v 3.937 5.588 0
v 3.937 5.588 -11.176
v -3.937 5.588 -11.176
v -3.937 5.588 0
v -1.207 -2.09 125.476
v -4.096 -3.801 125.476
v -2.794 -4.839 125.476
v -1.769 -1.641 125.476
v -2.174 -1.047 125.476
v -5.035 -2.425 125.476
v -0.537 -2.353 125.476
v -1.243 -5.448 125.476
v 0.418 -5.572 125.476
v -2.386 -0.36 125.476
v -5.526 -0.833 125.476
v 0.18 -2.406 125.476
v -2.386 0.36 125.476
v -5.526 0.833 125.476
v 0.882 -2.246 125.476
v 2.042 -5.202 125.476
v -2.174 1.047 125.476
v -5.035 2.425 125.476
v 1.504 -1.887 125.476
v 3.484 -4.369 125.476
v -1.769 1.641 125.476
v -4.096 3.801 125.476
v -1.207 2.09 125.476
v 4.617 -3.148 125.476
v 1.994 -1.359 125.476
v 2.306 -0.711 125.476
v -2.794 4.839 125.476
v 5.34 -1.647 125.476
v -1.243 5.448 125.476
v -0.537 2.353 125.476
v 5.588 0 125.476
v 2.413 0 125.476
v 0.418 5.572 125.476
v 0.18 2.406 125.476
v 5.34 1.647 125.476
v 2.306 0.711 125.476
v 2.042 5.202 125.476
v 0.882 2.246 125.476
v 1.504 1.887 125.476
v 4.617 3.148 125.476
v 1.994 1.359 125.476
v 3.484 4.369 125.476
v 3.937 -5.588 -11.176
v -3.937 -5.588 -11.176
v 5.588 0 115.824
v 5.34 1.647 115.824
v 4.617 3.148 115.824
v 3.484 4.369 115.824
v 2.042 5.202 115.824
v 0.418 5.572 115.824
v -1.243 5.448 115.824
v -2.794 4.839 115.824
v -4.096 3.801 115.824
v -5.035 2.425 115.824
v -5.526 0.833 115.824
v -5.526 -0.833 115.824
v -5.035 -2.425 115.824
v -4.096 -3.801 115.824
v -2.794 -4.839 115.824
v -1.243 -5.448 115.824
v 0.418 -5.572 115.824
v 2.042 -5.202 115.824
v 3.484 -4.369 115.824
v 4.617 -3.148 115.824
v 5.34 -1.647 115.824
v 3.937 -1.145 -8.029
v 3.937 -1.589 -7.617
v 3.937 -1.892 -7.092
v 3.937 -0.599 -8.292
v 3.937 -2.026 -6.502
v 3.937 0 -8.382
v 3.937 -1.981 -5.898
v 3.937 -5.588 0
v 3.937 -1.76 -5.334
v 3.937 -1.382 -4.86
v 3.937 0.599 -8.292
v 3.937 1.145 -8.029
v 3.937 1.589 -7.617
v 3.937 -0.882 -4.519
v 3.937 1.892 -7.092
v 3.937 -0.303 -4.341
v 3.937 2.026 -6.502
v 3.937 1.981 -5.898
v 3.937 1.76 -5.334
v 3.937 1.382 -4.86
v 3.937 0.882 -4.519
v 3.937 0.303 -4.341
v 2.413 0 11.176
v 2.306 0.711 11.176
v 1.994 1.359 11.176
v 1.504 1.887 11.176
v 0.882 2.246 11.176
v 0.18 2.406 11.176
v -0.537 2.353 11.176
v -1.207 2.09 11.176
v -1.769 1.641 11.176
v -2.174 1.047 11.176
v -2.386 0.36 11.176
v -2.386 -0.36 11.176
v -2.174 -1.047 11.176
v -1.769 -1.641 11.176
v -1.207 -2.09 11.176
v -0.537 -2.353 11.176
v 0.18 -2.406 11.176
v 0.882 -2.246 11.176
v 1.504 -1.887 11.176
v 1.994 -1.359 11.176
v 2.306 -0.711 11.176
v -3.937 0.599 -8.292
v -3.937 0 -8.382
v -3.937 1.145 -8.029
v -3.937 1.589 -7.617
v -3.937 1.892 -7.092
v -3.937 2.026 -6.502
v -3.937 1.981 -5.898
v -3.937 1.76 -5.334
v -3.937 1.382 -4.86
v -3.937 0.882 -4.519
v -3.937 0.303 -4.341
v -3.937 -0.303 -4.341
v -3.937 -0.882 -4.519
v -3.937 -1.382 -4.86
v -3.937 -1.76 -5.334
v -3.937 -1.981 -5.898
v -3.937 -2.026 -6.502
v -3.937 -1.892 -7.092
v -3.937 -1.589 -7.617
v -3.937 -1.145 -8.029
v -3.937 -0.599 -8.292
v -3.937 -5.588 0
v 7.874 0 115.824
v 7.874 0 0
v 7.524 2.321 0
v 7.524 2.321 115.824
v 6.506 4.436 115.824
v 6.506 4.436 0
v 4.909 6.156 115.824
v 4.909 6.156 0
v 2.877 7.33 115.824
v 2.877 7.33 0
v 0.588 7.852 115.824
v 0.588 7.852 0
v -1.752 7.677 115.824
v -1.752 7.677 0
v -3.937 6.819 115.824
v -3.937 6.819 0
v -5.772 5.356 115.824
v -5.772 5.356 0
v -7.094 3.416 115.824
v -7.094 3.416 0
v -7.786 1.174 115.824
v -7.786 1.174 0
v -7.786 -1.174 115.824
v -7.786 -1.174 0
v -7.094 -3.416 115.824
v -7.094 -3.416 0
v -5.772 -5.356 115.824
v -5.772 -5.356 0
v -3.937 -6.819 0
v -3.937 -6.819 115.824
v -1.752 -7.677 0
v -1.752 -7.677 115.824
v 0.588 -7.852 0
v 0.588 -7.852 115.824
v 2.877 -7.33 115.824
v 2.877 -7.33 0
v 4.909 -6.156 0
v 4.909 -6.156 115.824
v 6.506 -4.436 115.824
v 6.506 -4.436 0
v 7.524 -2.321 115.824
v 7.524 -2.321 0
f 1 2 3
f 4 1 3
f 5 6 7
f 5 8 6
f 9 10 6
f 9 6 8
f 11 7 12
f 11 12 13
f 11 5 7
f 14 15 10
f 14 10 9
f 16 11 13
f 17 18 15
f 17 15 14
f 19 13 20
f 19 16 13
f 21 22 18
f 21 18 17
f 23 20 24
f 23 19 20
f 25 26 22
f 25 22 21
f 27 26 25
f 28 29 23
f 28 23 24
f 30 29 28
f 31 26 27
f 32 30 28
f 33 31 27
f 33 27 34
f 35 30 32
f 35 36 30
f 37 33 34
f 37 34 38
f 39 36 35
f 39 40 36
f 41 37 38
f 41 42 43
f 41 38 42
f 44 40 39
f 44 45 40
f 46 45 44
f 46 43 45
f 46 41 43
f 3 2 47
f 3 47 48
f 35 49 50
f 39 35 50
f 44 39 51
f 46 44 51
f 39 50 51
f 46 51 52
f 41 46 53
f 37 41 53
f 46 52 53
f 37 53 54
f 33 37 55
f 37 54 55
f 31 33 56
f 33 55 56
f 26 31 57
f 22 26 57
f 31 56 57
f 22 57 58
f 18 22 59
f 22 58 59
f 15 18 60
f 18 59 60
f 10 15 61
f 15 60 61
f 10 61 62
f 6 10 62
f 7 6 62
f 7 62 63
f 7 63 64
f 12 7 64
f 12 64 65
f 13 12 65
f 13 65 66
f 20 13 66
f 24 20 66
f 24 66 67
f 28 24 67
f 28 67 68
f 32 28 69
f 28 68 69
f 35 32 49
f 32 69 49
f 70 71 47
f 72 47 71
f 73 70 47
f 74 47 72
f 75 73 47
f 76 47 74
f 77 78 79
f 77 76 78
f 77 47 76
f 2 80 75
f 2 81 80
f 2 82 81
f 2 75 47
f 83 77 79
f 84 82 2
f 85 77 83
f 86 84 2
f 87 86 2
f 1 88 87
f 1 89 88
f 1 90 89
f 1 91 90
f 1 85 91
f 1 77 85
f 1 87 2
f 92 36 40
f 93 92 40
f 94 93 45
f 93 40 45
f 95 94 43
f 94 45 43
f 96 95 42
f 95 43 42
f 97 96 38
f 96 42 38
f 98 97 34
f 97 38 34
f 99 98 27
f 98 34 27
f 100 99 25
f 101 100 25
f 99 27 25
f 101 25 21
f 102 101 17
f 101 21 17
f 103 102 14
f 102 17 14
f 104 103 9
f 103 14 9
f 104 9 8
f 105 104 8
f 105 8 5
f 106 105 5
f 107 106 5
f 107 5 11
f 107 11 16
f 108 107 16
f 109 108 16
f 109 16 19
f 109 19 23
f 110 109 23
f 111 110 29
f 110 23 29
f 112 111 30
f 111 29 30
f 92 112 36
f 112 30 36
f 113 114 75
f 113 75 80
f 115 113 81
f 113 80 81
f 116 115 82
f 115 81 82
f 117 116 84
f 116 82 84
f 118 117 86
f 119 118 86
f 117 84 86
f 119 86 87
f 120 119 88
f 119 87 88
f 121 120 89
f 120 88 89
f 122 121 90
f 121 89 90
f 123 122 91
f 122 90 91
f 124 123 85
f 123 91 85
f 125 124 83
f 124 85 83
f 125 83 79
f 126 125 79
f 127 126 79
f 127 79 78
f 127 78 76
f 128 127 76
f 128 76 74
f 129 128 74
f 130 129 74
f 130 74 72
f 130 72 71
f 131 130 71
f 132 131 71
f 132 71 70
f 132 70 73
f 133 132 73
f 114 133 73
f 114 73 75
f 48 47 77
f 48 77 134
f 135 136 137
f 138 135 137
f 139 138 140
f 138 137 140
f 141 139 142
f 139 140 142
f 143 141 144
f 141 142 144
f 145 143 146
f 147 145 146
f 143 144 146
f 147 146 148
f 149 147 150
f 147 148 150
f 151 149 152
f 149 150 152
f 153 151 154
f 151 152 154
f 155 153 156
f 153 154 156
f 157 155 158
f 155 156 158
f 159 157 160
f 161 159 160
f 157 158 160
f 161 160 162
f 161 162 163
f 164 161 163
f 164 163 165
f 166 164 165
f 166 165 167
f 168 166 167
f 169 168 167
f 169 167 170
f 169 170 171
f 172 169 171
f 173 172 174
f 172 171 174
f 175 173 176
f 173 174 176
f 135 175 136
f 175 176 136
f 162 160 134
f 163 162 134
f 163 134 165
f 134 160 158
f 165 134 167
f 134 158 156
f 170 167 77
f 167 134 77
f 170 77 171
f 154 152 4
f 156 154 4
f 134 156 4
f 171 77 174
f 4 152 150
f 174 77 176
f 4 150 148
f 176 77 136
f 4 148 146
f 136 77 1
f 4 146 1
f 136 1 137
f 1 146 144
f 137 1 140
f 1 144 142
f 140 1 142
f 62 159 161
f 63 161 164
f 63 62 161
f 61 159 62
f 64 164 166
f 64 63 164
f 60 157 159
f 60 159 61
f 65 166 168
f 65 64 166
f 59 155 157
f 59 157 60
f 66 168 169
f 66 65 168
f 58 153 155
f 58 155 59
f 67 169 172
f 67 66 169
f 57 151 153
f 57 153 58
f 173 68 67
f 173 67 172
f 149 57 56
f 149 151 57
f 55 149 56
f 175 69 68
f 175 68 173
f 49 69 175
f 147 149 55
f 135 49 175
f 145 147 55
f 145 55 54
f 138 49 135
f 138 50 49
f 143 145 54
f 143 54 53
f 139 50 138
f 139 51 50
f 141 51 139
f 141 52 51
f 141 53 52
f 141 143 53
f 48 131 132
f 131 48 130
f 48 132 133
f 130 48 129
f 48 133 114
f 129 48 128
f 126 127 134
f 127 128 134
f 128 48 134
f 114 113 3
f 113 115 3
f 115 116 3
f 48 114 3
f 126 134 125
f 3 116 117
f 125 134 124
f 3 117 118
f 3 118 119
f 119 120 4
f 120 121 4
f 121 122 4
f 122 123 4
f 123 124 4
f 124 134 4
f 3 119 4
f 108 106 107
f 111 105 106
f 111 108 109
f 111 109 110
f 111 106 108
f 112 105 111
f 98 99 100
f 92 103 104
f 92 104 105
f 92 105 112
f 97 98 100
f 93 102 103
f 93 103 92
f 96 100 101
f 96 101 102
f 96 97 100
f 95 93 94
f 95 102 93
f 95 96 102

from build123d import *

# Parameters (mm, degrees)
SKETCH1_R           = 7.874
BOSS_EXTRUDE1_DEPTH = 115.824
SKETCH2_R           = 5.588
BOSS_EXTRUDE2_DEPTH = 9.652
SKETCH3_W           = 7.874
SKETCH3_H           = 11.176
BOSS_EXTRUDE3_DEPTH = 11.176
SKETCH4_R           = 2.032
CUT_EXTRUDE1_DEPTH  = 12.811
SKETCH5_R           = 2.413
CUT_EXTRUDE2_DEPTH  = 114.3


with BuildPart() as part:
    # Sketch1 → Boss-Extrude1 (new body)
    with BuildSketch(Plane.XY):
        Circle(SKETCH1_R)
    extrude(amount=BOSS_EXTRUDE1_DEPTH)

    # Sketch2 → Boss-Extrude2 (add)
    with BuildSketch(Plane.XY.offset(115.824)):
        Circle(SKETCH2_R)
    extrude(amount=BOSS_EXTRUDE2_DEPTH)

    # Sketch3 → Boss-Extrude3 (add)
    with BuildSketch(Plane(origin=(0, 0, 0), x_dir=(-1, 0, 0), z_dir=(0, 0, -1))):
        Rectangle(SKETCH3_W, SKETCH3_H)
    extrude(amount=BOSS_EXTRUDE3_DEPTH)

    # Sketch4 → Cut-Extrude1 (cut, through all)
    with BuildSketch(Plane(origin=(3.937, 0, 0), x_dir=(0, 0, -1), z_dir=(1, 0, 0))):
        with Locations((6.35, 0)):
            Circle(SKETCH4_R)
    extrude(amount=-CUT_EXTRUDE1_DEPTH, mode=Mode.SUBTRACT)

    # Sketch5 → Cut-Extrude2 (cut)
    with BuildSketch(Plane.XY.offset(125.476)):
        Circle(SKETCH5_R)
    extrude(amount=-CUT_EXTRUDE2_DEPTH, mode=Mode.SUBTRACT)


solid = part.part
